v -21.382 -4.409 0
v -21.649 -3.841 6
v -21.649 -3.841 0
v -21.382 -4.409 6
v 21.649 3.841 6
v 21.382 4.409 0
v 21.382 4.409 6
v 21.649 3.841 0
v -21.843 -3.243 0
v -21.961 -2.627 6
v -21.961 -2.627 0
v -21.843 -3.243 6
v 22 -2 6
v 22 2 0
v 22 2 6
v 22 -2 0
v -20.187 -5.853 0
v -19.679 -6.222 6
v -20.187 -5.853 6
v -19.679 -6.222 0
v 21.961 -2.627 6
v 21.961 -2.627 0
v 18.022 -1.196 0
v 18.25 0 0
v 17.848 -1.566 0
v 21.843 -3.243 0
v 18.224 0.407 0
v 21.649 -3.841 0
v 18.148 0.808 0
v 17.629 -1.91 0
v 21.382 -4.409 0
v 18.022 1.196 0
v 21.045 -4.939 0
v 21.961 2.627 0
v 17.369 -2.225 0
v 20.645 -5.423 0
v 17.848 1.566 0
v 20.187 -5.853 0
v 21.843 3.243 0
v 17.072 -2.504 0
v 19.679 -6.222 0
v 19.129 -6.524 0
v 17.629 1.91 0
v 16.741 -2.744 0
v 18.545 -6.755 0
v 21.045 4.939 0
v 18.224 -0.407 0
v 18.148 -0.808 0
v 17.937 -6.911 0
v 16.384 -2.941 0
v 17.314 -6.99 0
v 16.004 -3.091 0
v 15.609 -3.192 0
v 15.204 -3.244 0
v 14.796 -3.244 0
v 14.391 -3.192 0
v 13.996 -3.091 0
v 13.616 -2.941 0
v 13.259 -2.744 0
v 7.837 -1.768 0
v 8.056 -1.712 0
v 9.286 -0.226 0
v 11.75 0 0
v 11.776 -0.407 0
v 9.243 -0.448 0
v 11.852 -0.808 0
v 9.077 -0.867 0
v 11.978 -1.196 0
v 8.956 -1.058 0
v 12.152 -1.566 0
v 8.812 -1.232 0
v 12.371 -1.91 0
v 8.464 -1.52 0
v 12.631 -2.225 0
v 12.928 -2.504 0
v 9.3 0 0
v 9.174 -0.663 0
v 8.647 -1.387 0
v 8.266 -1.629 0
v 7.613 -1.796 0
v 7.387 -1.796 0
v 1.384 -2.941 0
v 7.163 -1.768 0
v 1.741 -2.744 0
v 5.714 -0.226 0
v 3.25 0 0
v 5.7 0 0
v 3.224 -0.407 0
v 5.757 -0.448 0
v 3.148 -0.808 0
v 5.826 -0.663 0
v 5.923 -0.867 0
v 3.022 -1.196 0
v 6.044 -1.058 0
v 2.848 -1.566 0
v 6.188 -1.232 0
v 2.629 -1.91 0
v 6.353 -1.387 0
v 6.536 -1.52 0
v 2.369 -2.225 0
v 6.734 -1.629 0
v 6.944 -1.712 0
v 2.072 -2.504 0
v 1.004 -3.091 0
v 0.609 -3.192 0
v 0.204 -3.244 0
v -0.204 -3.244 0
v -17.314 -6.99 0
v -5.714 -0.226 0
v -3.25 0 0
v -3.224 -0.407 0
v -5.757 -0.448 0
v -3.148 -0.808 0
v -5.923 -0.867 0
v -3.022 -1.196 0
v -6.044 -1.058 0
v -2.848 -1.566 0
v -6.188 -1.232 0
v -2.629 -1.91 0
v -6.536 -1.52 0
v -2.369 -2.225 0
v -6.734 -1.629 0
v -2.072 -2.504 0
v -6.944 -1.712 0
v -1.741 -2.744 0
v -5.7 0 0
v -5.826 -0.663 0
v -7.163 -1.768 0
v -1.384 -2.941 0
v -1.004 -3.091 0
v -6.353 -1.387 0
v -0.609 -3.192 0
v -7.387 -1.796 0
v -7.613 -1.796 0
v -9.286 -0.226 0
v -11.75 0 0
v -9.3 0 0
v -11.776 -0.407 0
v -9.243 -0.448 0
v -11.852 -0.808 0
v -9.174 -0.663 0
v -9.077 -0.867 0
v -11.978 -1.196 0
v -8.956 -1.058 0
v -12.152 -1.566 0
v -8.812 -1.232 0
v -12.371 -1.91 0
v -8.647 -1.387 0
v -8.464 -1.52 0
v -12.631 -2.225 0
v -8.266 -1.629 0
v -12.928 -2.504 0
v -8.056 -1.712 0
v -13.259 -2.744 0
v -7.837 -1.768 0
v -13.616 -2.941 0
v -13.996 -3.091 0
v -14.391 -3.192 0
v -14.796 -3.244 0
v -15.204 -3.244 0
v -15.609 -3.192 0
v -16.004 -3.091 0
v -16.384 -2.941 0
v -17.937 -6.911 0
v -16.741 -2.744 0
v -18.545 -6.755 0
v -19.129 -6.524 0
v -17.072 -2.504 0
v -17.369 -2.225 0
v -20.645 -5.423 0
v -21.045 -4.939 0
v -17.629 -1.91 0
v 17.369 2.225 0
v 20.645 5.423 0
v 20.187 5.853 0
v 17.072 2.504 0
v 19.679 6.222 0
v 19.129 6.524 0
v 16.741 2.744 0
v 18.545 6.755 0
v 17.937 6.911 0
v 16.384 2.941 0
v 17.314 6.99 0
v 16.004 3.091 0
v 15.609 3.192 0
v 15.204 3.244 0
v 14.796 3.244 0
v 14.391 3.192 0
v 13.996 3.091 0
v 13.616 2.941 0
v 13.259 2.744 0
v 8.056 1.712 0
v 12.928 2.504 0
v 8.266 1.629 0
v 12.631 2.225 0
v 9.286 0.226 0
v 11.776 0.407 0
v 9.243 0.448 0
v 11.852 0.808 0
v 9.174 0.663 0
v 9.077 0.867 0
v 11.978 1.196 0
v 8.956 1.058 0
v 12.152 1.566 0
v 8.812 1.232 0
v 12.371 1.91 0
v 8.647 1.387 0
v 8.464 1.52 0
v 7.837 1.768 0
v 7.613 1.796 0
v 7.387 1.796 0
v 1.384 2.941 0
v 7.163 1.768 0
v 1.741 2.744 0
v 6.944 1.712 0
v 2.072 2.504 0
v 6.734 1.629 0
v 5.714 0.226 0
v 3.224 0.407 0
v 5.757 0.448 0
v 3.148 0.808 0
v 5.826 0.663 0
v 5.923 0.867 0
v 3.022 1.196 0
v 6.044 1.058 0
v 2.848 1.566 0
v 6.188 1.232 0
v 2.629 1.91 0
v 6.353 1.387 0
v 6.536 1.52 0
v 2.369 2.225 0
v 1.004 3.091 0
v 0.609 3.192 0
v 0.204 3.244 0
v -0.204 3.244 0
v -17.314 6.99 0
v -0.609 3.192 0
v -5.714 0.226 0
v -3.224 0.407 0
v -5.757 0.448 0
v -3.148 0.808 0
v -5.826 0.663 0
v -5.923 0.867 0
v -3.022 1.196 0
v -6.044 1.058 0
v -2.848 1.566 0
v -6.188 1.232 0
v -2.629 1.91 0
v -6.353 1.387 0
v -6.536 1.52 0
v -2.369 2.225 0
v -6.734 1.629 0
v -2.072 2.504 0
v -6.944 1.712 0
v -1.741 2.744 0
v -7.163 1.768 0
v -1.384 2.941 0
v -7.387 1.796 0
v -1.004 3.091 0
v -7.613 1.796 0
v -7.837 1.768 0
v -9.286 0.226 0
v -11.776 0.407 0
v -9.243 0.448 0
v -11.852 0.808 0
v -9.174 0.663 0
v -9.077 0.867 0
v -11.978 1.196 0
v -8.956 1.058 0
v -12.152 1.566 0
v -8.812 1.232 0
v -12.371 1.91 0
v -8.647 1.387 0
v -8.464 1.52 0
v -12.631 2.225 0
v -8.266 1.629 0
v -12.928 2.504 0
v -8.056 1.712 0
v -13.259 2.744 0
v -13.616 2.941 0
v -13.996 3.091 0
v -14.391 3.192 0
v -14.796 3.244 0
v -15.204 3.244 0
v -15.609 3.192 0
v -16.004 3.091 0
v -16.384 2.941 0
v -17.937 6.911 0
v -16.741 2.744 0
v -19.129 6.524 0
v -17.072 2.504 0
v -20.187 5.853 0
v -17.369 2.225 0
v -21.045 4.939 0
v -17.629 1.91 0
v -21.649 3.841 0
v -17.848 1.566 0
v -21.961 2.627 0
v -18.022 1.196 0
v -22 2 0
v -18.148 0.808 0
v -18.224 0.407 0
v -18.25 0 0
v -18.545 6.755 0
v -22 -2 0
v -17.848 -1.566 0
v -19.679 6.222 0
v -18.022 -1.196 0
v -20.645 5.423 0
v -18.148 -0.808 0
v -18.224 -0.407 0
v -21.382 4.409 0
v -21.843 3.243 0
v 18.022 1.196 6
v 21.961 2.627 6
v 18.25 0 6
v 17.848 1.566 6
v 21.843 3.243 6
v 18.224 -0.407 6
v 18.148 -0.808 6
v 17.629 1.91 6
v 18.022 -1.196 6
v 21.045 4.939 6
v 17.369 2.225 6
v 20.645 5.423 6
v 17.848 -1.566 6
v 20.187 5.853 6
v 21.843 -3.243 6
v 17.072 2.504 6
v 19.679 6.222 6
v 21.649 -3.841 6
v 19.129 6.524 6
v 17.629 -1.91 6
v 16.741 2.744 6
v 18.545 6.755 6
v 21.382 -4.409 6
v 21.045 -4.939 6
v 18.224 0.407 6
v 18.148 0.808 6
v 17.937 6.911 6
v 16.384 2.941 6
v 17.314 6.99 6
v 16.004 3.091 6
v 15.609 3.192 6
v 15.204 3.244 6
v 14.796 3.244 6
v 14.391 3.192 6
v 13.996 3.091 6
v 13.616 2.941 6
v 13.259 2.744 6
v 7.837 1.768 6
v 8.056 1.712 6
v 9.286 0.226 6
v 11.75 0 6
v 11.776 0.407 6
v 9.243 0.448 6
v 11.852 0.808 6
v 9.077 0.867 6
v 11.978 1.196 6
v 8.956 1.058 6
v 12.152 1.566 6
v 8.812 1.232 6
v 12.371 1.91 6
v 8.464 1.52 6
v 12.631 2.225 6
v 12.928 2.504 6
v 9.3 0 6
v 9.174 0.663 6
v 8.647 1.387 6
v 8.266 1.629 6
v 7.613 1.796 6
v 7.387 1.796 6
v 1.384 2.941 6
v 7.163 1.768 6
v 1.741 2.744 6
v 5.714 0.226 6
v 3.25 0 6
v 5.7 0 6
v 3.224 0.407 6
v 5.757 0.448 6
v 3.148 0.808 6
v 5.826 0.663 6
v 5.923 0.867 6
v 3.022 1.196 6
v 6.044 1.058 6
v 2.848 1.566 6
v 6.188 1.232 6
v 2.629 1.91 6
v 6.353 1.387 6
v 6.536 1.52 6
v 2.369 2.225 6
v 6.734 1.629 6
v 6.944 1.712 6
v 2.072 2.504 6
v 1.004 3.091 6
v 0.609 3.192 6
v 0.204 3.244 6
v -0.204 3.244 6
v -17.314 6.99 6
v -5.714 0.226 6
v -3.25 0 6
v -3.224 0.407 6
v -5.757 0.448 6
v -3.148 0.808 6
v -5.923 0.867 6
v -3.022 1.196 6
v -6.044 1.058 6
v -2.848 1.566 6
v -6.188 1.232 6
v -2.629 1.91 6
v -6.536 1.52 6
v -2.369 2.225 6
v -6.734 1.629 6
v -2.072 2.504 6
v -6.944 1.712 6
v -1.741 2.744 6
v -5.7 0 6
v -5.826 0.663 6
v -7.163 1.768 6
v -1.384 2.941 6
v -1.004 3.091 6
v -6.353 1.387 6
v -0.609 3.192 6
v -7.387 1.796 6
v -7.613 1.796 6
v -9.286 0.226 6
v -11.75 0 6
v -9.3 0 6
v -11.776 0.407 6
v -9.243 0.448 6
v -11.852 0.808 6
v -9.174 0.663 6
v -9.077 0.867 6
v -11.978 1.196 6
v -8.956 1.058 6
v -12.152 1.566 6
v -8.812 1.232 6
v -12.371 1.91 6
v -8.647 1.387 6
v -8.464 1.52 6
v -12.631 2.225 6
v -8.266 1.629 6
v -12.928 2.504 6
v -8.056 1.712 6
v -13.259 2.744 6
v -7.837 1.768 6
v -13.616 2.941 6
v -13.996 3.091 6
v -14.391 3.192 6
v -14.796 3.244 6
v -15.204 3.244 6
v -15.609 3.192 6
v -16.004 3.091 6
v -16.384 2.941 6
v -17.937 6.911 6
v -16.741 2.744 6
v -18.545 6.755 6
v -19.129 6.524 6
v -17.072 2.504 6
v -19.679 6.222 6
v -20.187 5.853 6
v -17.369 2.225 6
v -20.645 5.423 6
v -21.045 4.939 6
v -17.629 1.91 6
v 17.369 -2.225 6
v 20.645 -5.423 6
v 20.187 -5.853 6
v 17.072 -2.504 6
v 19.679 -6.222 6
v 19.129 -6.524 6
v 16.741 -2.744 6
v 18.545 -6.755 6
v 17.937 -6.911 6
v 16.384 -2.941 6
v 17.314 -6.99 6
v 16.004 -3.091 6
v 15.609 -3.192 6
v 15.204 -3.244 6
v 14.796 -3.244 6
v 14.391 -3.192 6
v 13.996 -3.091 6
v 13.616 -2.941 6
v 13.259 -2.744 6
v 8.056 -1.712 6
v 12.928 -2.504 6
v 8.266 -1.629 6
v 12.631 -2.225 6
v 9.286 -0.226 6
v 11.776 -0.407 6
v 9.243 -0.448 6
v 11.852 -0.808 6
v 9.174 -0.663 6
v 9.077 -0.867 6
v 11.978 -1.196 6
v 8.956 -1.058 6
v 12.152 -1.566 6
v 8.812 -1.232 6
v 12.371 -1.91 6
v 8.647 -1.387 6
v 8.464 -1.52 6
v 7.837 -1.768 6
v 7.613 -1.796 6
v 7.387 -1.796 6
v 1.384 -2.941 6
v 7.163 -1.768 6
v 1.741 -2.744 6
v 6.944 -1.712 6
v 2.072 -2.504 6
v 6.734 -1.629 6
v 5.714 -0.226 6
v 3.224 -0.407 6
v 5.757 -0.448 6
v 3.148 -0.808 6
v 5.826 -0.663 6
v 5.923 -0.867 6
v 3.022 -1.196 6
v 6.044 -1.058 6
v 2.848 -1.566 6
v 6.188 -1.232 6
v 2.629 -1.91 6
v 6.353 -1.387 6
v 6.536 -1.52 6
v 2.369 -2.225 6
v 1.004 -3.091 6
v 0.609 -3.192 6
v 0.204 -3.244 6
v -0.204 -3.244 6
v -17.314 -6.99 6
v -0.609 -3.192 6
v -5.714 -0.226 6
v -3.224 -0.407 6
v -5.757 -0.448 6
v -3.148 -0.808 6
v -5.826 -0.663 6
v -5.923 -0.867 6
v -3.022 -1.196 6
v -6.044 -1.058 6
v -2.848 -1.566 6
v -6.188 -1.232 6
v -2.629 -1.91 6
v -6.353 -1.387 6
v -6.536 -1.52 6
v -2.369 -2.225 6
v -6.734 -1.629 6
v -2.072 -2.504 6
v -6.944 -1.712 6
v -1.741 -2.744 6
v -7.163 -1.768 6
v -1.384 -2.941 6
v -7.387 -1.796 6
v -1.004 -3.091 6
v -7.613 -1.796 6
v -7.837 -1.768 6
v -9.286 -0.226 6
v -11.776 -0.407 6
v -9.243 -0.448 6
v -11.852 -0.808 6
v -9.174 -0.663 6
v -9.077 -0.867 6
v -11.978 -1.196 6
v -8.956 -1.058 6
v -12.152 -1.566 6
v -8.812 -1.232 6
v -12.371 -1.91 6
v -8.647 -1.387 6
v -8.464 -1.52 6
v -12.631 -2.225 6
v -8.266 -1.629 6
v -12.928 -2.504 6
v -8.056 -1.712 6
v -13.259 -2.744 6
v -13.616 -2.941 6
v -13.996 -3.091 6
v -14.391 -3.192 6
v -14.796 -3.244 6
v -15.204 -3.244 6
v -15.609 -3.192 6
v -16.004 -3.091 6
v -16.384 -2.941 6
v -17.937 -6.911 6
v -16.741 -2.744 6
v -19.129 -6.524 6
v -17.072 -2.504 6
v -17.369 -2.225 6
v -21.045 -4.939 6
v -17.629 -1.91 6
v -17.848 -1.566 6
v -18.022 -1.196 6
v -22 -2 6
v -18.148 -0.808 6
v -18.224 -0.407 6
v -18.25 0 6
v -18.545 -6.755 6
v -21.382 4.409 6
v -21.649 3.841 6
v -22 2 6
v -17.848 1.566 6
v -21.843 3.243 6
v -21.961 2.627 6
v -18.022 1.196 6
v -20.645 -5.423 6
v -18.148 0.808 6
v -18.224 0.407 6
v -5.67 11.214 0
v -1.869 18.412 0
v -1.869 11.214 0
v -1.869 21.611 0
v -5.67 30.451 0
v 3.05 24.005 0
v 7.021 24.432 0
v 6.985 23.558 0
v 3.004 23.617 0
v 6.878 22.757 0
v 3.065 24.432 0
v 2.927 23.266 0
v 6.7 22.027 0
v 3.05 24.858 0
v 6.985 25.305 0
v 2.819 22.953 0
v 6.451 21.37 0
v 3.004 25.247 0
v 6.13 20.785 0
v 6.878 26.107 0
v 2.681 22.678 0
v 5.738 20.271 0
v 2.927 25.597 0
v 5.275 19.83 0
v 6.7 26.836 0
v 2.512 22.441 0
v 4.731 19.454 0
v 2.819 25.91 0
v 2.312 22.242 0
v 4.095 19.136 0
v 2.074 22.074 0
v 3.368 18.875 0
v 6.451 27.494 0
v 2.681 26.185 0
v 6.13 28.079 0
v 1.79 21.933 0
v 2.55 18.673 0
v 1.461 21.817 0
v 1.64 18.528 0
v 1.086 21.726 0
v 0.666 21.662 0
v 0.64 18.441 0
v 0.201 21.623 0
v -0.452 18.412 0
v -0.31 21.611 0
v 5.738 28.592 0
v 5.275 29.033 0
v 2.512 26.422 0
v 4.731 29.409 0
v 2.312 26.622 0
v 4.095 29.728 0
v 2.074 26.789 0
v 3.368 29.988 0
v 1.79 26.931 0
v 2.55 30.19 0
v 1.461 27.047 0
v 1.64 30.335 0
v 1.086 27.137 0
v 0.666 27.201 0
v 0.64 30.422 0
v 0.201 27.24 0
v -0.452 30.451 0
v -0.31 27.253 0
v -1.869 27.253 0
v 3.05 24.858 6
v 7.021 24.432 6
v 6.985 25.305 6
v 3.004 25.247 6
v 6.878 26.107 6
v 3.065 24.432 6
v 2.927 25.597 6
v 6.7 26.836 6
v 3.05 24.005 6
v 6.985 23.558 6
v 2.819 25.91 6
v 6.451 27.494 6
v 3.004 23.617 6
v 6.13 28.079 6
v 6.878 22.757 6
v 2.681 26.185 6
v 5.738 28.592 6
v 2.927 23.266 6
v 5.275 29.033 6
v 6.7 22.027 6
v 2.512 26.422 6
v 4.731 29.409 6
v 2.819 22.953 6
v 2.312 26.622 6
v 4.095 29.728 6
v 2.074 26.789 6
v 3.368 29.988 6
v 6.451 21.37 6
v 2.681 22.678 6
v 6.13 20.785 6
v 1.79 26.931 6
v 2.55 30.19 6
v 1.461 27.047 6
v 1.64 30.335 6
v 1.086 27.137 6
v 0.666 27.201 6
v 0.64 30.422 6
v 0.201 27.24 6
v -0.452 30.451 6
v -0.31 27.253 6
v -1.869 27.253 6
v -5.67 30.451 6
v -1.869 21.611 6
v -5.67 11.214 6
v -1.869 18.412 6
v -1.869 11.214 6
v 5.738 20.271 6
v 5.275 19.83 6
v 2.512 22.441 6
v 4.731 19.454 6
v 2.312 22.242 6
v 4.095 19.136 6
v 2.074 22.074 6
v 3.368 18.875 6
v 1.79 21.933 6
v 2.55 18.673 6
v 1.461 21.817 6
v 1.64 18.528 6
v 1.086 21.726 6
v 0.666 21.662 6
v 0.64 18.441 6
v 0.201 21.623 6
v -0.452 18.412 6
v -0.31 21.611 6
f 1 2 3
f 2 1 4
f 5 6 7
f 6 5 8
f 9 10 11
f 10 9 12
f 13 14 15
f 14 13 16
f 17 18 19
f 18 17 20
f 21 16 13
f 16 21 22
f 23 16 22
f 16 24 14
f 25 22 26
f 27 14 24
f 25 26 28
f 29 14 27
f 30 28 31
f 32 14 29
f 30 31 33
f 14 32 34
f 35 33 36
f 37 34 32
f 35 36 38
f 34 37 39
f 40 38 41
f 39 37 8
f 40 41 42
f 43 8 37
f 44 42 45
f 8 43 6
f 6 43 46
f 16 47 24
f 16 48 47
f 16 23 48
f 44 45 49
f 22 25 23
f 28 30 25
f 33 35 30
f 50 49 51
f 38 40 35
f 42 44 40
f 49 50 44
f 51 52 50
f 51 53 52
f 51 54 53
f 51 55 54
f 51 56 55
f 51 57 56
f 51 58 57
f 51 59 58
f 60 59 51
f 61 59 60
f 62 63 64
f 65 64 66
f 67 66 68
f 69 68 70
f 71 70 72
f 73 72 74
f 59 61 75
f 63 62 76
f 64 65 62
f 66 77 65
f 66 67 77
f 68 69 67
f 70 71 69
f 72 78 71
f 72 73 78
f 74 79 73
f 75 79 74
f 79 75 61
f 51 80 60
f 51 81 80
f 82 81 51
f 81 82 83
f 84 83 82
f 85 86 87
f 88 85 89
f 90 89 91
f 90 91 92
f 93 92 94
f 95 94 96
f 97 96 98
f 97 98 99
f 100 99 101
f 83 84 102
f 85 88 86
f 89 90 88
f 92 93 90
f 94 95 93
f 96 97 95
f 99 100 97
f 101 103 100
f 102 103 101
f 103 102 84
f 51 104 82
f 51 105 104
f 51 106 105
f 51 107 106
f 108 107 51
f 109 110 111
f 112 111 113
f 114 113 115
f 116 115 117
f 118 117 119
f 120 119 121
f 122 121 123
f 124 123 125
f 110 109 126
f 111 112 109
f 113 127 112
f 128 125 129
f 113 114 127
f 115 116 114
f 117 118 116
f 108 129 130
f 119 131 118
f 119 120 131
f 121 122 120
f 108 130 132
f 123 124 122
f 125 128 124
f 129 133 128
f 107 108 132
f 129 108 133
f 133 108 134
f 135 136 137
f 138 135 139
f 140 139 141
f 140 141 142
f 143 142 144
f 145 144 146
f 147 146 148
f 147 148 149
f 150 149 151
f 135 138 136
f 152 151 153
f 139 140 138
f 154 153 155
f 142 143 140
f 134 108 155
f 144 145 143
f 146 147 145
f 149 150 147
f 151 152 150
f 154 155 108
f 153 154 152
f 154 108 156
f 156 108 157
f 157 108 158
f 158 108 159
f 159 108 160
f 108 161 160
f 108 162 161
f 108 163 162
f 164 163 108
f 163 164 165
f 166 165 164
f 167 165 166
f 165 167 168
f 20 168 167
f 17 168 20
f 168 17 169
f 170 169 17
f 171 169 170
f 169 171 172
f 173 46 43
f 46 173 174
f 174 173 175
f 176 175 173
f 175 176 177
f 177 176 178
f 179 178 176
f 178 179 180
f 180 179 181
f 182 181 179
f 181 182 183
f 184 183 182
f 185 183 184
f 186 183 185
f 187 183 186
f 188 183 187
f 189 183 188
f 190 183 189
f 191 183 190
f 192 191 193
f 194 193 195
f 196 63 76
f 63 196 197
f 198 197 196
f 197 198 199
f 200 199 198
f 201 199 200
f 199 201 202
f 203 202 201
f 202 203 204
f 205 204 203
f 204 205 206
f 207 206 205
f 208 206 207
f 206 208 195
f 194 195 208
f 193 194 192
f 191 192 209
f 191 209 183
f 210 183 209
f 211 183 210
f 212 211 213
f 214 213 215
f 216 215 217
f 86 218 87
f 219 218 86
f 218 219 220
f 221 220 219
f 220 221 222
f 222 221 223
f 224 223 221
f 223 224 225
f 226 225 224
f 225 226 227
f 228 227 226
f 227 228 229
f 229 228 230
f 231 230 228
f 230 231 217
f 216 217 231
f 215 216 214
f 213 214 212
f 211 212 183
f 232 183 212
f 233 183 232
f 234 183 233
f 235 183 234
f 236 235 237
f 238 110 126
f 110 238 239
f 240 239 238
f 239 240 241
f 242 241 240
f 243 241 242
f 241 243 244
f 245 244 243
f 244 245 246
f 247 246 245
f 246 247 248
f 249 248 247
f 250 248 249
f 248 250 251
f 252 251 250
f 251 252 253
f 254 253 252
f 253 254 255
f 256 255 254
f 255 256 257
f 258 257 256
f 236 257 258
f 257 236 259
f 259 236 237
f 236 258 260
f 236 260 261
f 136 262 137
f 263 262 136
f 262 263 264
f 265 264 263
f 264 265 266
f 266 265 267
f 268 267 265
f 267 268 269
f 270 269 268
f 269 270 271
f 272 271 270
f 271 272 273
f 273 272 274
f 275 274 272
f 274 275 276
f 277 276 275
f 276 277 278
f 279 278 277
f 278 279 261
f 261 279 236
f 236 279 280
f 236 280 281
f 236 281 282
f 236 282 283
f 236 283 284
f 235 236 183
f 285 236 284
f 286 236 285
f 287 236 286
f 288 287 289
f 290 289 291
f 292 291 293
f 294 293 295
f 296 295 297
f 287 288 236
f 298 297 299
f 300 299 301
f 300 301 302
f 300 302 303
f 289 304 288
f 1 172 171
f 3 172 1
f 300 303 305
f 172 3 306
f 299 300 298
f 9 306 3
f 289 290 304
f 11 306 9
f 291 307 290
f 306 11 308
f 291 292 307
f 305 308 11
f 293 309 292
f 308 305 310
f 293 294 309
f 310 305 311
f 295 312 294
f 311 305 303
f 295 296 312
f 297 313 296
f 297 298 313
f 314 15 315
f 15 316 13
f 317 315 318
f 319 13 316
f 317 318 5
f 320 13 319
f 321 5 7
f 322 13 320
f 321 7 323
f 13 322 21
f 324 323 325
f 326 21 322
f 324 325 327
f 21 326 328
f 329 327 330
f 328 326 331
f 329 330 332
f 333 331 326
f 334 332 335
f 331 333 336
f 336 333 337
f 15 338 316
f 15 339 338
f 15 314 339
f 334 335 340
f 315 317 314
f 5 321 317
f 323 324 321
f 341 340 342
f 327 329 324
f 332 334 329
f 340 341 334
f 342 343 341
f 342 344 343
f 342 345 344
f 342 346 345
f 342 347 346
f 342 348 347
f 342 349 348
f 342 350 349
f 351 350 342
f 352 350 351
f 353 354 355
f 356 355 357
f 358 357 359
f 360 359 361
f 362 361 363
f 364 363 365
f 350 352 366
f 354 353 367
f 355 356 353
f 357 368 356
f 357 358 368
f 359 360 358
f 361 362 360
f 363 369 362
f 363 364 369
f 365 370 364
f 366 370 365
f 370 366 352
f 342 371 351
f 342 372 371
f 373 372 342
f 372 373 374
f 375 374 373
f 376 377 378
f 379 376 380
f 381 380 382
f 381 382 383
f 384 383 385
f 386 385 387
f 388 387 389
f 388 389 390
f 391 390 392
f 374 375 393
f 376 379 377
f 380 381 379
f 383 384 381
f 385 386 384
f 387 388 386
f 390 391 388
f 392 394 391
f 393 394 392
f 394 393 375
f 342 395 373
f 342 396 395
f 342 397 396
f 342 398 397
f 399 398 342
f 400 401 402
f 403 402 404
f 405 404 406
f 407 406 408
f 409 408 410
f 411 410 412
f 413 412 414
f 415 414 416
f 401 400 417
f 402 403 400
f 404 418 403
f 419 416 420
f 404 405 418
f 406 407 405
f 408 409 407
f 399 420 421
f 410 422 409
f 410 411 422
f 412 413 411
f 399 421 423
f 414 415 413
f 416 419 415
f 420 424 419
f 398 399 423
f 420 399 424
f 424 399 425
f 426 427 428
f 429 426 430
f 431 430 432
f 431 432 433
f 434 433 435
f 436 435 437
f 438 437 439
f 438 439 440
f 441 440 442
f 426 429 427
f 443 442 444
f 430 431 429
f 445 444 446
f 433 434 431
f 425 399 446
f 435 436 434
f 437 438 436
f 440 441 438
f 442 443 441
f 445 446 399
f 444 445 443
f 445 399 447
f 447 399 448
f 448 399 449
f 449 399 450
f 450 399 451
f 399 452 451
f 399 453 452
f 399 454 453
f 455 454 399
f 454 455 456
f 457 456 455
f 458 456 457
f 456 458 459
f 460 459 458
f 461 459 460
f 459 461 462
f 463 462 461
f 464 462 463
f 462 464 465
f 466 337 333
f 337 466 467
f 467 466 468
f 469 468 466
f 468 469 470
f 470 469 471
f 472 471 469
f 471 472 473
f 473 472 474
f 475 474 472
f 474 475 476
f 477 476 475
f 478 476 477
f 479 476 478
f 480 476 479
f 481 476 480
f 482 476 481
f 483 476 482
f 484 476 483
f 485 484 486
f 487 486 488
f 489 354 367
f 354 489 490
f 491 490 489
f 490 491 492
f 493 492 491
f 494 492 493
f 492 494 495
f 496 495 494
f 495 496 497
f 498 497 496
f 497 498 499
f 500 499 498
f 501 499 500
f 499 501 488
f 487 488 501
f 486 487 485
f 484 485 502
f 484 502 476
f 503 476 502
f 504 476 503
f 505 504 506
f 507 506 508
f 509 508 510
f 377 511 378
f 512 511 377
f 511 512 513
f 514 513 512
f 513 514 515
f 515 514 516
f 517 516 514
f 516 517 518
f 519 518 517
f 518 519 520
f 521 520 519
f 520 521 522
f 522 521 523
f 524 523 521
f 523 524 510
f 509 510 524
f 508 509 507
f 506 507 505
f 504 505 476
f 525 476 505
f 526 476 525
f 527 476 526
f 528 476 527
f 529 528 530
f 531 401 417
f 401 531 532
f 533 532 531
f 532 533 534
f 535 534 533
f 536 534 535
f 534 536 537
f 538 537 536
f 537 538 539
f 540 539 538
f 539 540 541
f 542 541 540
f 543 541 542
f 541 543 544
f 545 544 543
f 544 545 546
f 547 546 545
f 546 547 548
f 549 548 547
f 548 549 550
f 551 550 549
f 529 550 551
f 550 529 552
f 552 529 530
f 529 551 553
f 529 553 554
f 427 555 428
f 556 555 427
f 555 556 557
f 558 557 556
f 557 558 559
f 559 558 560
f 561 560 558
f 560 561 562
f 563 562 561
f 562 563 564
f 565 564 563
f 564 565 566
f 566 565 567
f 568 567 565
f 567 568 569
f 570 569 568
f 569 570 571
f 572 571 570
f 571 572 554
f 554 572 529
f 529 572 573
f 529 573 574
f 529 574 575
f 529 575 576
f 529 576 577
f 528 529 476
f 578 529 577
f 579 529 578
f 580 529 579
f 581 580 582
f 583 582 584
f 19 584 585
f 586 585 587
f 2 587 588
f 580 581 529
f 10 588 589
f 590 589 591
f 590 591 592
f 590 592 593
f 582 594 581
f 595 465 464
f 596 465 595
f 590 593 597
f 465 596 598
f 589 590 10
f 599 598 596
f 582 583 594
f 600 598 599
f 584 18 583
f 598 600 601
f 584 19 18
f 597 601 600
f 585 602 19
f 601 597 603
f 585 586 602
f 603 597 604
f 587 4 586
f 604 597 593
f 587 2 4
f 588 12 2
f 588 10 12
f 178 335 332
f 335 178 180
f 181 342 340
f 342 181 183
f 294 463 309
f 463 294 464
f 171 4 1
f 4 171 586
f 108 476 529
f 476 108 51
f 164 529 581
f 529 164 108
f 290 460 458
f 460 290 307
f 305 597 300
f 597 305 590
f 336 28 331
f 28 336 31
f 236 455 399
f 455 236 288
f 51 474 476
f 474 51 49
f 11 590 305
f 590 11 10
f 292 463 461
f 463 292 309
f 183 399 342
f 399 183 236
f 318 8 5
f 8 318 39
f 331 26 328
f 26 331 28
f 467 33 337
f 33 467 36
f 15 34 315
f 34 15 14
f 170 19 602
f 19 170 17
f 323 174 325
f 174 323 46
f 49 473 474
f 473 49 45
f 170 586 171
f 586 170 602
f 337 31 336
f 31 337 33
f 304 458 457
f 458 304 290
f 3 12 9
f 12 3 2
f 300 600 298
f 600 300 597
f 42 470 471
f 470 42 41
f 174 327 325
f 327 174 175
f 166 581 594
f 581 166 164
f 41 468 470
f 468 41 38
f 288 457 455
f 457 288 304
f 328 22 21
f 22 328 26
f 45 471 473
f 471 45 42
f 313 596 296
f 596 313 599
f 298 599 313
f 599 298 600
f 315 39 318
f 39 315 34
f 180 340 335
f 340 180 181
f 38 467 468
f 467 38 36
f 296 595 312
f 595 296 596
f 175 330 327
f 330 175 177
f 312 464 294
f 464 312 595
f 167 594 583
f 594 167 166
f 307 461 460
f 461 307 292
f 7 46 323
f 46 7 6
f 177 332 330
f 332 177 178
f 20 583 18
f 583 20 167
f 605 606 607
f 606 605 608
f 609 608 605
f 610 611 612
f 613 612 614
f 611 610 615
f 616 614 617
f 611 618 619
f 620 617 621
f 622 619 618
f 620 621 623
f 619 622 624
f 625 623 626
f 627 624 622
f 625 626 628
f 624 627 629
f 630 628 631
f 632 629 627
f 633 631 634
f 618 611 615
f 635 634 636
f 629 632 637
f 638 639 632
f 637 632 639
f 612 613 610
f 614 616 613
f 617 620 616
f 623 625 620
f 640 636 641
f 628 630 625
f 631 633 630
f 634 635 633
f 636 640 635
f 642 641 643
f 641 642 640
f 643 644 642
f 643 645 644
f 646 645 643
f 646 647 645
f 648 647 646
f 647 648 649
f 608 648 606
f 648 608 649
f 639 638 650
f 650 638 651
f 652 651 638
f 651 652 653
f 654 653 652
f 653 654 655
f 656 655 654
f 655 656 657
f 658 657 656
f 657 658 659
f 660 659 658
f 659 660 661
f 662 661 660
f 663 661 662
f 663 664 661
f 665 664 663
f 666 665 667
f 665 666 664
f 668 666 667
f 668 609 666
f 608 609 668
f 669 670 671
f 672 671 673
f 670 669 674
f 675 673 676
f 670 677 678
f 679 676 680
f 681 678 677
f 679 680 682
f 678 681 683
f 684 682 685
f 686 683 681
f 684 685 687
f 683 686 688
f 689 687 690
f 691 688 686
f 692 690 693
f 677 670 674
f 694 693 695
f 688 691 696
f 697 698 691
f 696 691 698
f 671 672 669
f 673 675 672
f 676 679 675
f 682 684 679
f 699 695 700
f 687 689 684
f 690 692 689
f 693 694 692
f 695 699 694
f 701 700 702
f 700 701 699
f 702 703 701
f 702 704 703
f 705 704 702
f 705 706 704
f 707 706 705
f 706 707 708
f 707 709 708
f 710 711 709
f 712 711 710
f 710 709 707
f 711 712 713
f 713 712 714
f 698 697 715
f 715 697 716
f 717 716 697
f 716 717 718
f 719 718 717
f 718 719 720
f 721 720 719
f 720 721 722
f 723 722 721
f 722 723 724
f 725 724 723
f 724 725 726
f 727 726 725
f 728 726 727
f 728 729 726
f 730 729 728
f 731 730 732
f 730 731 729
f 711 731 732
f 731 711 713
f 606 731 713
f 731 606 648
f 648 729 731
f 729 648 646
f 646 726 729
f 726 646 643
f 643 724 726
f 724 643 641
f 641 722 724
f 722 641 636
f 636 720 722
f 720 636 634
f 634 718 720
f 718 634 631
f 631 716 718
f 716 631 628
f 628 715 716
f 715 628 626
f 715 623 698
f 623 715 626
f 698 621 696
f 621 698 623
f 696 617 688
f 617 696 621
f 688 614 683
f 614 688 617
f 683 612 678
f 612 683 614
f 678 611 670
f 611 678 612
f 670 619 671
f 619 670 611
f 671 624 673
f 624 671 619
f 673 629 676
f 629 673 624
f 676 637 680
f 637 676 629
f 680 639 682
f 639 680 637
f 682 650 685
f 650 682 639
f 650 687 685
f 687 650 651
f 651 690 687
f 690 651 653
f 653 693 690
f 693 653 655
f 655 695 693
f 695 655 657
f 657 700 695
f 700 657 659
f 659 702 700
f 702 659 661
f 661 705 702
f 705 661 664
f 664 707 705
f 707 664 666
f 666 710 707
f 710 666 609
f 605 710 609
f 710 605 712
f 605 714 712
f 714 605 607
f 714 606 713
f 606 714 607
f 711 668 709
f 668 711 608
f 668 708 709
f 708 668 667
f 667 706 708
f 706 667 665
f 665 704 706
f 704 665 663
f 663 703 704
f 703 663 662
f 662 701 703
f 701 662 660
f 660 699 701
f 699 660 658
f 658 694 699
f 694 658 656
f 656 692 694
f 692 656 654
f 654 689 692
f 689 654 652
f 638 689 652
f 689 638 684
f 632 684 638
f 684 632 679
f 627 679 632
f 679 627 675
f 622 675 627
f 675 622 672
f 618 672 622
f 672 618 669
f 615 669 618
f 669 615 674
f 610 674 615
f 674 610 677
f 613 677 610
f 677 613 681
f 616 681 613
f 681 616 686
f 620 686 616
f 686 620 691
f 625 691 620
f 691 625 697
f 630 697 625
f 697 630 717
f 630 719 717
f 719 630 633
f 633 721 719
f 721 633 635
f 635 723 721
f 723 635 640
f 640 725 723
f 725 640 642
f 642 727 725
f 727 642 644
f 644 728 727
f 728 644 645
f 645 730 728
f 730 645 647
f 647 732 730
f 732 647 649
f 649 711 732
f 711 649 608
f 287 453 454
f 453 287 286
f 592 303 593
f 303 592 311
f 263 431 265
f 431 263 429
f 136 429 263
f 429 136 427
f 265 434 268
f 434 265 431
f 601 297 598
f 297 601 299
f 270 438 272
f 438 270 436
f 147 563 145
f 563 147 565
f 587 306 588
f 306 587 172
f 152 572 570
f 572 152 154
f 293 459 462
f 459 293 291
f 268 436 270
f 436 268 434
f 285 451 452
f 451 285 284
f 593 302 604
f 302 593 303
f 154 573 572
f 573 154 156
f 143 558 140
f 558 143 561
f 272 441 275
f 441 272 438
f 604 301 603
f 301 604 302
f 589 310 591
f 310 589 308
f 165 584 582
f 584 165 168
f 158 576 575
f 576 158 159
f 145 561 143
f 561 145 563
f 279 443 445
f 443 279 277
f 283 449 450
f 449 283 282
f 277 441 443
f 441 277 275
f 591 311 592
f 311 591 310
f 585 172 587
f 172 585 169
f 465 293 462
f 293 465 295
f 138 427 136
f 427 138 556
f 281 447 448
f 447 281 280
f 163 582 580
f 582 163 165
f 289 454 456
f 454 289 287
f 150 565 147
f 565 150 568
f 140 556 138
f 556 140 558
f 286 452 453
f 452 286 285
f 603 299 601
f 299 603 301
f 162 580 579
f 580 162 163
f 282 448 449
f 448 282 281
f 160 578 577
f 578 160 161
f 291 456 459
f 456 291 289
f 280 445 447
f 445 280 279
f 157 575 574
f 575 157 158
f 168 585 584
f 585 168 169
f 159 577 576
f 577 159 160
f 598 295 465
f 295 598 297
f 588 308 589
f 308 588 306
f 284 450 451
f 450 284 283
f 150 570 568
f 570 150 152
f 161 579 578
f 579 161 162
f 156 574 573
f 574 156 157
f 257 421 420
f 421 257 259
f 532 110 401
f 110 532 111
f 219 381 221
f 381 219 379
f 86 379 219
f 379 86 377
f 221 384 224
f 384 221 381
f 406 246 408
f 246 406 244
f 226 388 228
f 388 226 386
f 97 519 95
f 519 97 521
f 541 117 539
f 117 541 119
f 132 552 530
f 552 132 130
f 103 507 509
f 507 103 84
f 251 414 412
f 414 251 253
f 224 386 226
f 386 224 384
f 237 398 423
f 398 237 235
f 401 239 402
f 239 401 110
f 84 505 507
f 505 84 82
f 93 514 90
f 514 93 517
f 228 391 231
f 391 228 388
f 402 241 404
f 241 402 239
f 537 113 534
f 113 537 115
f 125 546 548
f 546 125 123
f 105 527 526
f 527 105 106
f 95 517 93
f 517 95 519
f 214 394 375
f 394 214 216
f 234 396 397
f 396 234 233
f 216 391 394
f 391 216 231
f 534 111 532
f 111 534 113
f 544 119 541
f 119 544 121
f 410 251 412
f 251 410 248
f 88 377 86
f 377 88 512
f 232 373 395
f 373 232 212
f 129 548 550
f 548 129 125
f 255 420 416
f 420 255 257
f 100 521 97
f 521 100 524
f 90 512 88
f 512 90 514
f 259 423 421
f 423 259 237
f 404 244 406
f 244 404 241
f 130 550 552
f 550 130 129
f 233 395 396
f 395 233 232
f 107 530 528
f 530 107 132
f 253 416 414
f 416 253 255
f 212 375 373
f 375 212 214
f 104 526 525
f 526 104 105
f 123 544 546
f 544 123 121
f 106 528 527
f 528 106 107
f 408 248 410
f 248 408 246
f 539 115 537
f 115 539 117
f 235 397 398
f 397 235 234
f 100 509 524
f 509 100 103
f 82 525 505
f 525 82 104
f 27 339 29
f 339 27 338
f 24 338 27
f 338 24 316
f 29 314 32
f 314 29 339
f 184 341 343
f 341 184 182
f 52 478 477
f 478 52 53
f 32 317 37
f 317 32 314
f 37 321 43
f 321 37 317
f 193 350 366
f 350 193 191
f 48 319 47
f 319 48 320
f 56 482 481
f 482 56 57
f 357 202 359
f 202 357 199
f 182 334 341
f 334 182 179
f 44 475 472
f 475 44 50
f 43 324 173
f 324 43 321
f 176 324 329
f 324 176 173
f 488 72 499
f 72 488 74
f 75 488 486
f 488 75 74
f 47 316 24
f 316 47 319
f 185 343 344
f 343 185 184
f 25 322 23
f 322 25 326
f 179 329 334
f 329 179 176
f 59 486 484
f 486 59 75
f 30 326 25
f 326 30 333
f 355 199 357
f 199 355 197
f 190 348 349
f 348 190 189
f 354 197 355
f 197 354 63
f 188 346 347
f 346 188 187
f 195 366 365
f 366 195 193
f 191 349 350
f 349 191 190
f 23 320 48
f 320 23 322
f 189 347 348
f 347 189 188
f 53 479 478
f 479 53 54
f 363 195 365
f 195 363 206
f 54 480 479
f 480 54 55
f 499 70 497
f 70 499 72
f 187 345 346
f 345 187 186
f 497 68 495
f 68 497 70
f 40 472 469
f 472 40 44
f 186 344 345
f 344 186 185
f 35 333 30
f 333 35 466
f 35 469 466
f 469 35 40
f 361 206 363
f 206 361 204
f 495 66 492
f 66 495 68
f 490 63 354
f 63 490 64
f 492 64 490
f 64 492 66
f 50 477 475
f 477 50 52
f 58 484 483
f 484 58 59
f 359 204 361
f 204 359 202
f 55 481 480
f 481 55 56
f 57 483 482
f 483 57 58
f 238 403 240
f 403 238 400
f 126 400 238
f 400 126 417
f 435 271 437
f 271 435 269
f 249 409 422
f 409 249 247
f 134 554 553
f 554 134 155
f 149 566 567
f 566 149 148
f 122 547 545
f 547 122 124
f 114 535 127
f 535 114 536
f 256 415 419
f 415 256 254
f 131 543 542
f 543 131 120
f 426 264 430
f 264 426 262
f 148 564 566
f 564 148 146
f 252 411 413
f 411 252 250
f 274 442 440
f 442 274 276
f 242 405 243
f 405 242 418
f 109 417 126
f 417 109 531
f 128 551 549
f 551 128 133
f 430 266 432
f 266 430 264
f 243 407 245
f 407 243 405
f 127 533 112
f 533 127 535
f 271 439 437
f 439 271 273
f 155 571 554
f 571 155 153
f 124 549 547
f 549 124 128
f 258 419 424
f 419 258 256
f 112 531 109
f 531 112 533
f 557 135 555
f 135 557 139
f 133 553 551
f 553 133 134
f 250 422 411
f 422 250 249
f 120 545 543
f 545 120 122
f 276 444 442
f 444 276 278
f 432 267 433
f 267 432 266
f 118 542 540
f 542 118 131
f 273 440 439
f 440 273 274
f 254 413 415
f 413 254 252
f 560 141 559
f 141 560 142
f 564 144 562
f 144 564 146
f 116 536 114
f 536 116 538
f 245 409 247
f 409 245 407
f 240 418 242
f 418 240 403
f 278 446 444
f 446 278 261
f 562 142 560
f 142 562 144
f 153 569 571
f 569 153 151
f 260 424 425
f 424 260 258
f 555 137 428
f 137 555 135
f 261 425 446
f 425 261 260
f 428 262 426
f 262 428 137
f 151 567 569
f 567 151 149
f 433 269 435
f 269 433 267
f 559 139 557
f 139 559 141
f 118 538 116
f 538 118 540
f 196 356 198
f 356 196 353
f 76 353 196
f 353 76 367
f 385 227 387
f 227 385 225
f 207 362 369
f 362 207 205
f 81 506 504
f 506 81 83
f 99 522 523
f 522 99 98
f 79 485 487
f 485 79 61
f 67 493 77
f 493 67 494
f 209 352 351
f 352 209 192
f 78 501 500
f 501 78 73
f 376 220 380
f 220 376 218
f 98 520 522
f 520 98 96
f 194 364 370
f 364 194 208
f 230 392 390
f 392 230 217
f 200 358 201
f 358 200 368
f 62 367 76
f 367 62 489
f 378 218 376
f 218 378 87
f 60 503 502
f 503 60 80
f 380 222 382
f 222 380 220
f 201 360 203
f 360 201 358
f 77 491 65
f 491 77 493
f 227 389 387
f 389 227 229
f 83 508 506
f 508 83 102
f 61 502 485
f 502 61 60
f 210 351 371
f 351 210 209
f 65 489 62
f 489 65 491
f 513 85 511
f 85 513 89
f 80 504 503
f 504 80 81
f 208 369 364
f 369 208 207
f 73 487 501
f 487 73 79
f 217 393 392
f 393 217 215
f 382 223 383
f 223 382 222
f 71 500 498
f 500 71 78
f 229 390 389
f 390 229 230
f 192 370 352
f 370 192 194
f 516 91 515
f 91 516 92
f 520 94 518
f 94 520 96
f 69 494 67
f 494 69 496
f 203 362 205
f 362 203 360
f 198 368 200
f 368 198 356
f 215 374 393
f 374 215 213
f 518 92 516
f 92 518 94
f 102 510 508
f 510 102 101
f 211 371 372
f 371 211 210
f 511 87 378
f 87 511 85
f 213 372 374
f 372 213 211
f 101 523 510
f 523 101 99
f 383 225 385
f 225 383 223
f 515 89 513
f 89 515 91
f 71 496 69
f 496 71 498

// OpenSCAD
$fn = 50;


difference() {
	union() {
		hull() {
			translate(v = [-17.0000000000, 2.0000000000, 0]) {
				cylinder(h = 6, r = 5);
			}
			translate(v = [17.0000000000, 2.0000000000, 0]) {
				cylinder(h = 6, r = 5);
			}
			translate(v = [-17.0000000000, -2.0000000000, 0]) {
				cylinder(h = 6, r = 5);
			}
			translate(v = [17.0000000000, -2.0000000000, 0]) {
				cylinder(h = 6, r = 5);
			}
		}
		translate(v = [0, 30.0000000000, 0]) {
			linear_extrude(height = 6) {
				text(font = "DejaVu Sans Mono:style=Bold", halign = "center", size = 19.0000000000, text = "P", valign = "top");
			}
		}
	}
	union() {
		translate(v = [-15.0000000000, 0.0000000000, 0]) {
			translate(v = [0, 0, -100]) {
				cylinder(h = 200, r = 3.2500000000);
			}
		}
		translate(v = [0, 0, -100]) {
			cylinder(h = 200, r = 3.2500000000);
		}
		translate(v = [15.0000000000, 0.0000000000, 0]) {
			translate(v = [0, 0, -100]) {
				cylinder(h = 200, r = 3.2500000000);
			}
		}
		translate(v = [-15.0000000000, 0.0000000000, 0]) {
			translate(v = [0, 0, -100]) {
				cylinder(h = 200, r = 1.8000000000);
			}
		}
		translate(v = [-7.5000000000, 0.0000000000, 0]) {
			translate(v = [0, 0, -100]) {
				cylinder(h = 200, r = 1.8000000000);
			}
		}
		translate(v = [0, 0, -100]) {
			cylinder(h = 200, r = 1.8000000000);
		}
		translate(v = [7.5000000000, 0.0000000000, 0]) {
			translate(v = [0, 0, -100]) {
				cylinder(h = 200, r = 1.8000000000);
			}
		}
		translate(v = [15.0000000000, 0.0000000000, 0]) {
			translate(v = [0, 0, -100]) {
				cylinder(h = 200, r = 1.8000000000);
			}
		}
	}
}
